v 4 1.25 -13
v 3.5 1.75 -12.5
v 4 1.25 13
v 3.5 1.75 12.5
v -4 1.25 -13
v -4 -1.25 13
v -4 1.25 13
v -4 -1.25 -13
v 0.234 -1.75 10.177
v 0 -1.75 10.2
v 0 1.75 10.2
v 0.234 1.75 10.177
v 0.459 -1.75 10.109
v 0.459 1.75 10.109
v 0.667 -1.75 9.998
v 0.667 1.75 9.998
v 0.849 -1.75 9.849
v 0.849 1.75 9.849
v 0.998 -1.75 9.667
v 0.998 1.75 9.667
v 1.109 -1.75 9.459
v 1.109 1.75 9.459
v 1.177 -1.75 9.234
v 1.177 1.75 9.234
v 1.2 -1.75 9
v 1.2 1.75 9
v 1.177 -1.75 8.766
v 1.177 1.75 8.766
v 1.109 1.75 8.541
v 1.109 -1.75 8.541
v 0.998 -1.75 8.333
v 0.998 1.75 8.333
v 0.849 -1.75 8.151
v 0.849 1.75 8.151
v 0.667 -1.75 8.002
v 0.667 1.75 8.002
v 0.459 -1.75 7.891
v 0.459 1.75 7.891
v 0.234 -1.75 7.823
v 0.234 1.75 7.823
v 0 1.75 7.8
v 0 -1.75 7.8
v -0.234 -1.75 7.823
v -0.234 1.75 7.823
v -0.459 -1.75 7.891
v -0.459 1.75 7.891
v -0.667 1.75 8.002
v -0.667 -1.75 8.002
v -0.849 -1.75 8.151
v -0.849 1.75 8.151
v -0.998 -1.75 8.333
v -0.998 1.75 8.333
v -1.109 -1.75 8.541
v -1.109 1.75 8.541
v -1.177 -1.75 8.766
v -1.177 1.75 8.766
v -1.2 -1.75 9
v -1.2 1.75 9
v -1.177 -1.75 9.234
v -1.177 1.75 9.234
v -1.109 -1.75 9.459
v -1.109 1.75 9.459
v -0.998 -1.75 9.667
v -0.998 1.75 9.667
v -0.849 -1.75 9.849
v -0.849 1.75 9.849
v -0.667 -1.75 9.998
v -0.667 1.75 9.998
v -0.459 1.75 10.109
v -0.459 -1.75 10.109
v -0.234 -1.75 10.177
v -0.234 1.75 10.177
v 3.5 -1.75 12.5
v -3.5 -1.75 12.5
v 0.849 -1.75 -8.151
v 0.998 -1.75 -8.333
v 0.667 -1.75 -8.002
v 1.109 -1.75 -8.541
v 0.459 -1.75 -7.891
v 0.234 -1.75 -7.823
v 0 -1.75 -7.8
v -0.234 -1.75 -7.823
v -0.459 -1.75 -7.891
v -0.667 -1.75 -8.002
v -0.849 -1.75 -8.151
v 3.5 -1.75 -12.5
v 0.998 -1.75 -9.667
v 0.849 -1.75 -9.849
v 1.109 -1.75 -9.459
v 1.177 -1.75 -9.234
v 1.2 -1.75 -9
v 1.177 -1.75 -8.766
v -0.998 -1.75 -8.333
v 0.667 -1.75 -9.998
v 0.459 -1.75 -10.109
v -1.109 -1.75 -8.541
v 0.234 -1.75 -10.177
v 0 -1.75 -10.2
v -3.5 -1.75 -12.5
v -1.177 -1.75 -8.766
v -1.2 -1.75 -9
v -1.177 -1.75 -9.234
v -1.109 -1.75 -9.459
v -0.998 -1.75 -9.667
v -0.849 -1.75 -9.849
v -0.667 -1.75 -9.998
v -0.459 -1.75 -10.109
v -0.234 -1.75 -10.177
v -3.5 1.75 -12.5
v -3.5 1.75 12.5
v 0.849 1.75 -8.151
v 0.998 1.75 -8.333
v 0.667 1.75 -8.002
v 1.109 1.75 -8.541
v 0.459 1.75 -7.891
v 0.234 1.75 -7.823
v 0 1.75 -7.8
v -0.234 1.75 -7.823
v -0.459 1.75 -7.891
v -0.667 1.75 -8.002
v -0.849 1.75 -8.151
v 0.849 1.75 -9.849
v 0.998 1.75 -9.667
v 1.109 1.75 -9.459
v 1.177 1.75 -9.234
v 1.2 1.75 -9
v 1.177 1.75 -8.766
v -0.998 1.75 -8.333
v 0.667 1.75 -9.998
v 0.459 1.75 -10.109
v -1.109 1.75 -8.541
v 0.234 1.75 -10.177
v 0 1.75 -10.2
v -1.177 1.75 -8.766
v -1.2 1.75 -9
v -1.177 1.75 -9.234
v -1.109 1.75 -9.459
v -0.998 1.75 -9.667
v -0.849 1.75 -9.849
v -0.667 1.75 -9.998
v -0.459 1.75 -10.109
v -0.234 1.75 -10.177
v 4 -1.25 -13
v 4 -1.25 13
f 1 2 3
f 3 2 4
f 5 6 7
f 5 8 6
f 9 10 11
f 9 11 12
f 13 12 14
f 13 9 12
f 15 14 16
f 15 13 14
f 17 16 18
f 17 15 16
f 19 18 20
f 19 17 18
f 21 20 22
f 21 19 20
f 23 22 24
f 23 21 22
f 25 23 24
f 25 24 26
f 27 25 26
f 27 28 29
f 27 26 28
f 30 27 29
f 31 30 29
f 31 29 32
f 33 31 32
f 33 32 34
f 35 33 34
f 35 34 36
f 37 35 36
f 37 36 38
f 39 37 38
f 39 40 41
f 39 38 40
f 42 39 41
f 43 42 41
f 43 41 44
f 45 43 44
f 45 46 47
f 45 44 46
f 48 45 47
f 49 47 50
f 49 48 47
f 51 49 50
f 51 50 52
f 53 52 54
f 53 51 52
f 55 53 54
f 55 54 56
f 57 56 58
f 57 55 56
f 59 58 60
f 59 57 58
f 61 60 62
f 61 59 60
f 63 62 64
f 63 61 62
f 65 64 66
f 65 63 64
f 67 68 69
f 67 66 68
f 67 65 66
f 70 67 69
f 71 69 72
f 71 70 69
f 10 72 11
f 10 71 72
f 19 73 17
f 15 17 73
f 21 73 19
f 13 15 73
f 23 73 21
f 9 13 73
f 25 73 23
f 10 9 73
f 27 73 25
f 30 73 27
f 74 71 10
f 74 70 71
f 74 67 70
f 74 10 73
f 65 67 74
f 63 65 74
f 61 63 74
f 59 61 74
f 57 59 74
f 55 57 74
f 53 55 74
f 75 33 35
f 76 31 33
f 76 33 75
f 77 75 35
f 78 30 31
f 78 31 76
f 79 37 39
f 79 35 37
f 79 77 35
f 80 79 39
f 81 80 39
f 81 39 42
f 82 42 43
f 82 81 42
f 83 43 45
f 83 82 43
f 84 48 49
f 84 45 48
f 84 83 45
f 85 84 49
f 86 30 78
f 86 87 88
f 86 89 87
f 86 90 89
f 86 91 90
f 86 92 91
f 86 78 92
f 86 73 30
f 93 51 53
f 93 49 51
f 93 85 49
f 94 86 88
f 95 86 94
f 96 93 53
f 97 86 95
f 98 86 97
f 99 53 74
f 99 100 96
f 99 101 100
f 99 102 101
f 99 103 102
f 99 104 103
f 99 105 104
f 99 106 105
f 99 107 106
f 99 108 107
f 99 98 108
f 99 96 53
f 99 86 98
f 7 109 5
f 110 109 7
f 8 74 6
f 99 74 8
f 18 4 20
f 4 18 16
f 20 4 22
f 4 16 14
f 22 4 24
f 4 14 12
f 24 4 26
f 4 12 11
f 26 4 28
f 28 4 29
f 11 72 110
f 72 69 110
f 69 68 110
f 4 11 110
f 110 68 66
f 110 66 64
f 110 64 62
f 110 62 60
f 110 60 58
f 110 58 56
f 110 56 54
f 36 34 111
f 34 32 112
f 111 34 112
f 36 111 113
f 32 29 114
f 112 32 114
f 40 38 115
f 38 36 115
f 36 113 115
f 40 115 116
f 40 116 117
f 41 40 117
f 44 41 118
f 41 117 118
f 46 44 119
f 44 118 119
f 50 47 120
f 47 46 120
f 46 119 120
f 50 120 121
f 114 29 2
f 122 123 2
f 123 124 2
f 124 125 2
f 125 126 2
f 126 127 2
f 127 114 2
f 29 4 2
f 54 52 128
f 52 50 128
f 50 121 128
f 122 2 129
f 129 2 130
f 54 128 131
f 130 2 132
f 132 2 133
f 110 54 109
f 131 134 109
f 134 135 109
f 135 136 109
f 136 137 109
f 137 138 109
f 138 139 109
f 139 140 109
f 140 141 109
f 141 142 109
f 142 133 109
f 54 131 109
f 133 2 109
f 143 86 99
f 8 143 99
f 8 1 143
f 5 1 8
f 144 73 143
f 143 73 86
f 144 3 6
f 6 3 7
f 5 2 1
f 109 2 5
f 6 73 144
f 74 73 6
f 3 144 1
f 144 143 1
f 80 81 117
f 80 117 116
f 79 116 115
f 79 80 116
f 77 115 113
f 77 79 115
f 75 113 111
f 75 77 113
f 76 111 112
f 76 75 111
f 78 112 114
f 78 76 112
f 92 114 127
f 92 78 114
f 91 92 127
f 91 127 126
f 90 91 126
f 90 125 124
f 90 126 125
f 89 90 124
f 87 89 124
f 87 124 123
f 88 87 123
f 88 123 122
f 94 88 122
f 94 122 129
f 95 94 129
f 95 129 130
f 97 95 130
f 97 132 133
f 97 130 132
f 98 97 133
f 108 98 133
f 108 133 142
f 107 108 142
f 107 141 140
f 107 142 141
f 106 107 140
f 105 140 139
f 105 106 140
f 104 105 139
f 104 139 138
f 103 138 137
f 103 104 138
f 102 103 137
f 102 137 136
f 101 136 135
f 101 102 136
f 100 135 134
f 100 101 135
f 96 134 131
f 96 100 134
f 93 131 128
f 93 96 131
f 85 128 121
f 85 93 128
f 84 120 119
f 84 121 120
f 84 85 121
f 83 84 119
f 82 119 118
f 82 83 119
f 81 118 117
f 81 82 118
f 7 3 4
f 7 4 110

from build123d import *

# Parameters (mm, degrees)
SKETCH1_W               = 8
SKETCH1_H               = 3.5
BOSS_EXTRUDE1_DEPTH     = 5
SKETCH2_W               = 8
SKETCH2_H               = 3.5
BOSS_EXTRUDE2_DEPTH     = 8
CHAMFER1_SIZE           = 0.5
CUT_EXTRUDE1_DEPTH      = 15.044571905
CUT_EXTRUDE1_DEPTH_BACK = 15.044571905
SKETCH3_R               = 1.2


with BuildPart() as part:
    # Sketch1 → Boss-Extrude1 (new, symmetric)
    with BuildSketch(Plane.XY):
        Rectangle(SKETCH1_W, SKETCH1_H)
    extrude(amount=BOSS_EXTRUDE1_DEPTH, both=True)

    # Sketch2 → Boss-Extrude2 (add)
    with BuildSketch(Plane(origin=(0, 0, -5), x_dir=(-1, 0, 0), z_dir=(0, 0, -1))):
        Rectangle(SKETCH2_W, SKETCH2_H)
    boss_extrude2 = extrude(amount=BOSS_EXTRUDE2_DEPTH)

    # Mirror1: Boss-Extrude2 across plane
    add(boss_extrude2.mirror(Plane.XY))

    # Chamfer1
    chamfer1_edges = [part.edges().sort_by_distance(p)[0] for p in [
        (0, 1.75, -13),
        (0, -1.75, -13),
        (0, -1.75, 13),
        (0, 1.75, 13),
        (4, -1.75, 0),
        (-4, -1.75, 0),
        (-4, 1.75, 0),
        (4, 1.75, 0),
    ]]
    chamfer(chamfer1_edges, length=CHAMFER1_SIZE)

    # Sketch3 → Cut-Extrude1 (cut, two sides: drawn at the far end of the back side and taken through both)
    with BuildSketch(Plane(origin=(0, 1.75, 0), x_dir=(1, 0, 0), z_dir=(0, 1, 0)).offset(-CUT_EXTRUDE1_DEPTH_BACK)):
        with Locations(Location((0, -9, 0), (0, 0, 270))):
            Circle(SKETCH3_R)
        with Locations(Location((0, 9, 0), (0, 0, 270))):
            Circle(SKETCH3_R)
    extrude(amount=CUT_EXTRUDE1_DEPTH + CUT_EXTRUDE1_DEPTH_BACK, mode=Mode.SUBTRACT)


solid = part.part
